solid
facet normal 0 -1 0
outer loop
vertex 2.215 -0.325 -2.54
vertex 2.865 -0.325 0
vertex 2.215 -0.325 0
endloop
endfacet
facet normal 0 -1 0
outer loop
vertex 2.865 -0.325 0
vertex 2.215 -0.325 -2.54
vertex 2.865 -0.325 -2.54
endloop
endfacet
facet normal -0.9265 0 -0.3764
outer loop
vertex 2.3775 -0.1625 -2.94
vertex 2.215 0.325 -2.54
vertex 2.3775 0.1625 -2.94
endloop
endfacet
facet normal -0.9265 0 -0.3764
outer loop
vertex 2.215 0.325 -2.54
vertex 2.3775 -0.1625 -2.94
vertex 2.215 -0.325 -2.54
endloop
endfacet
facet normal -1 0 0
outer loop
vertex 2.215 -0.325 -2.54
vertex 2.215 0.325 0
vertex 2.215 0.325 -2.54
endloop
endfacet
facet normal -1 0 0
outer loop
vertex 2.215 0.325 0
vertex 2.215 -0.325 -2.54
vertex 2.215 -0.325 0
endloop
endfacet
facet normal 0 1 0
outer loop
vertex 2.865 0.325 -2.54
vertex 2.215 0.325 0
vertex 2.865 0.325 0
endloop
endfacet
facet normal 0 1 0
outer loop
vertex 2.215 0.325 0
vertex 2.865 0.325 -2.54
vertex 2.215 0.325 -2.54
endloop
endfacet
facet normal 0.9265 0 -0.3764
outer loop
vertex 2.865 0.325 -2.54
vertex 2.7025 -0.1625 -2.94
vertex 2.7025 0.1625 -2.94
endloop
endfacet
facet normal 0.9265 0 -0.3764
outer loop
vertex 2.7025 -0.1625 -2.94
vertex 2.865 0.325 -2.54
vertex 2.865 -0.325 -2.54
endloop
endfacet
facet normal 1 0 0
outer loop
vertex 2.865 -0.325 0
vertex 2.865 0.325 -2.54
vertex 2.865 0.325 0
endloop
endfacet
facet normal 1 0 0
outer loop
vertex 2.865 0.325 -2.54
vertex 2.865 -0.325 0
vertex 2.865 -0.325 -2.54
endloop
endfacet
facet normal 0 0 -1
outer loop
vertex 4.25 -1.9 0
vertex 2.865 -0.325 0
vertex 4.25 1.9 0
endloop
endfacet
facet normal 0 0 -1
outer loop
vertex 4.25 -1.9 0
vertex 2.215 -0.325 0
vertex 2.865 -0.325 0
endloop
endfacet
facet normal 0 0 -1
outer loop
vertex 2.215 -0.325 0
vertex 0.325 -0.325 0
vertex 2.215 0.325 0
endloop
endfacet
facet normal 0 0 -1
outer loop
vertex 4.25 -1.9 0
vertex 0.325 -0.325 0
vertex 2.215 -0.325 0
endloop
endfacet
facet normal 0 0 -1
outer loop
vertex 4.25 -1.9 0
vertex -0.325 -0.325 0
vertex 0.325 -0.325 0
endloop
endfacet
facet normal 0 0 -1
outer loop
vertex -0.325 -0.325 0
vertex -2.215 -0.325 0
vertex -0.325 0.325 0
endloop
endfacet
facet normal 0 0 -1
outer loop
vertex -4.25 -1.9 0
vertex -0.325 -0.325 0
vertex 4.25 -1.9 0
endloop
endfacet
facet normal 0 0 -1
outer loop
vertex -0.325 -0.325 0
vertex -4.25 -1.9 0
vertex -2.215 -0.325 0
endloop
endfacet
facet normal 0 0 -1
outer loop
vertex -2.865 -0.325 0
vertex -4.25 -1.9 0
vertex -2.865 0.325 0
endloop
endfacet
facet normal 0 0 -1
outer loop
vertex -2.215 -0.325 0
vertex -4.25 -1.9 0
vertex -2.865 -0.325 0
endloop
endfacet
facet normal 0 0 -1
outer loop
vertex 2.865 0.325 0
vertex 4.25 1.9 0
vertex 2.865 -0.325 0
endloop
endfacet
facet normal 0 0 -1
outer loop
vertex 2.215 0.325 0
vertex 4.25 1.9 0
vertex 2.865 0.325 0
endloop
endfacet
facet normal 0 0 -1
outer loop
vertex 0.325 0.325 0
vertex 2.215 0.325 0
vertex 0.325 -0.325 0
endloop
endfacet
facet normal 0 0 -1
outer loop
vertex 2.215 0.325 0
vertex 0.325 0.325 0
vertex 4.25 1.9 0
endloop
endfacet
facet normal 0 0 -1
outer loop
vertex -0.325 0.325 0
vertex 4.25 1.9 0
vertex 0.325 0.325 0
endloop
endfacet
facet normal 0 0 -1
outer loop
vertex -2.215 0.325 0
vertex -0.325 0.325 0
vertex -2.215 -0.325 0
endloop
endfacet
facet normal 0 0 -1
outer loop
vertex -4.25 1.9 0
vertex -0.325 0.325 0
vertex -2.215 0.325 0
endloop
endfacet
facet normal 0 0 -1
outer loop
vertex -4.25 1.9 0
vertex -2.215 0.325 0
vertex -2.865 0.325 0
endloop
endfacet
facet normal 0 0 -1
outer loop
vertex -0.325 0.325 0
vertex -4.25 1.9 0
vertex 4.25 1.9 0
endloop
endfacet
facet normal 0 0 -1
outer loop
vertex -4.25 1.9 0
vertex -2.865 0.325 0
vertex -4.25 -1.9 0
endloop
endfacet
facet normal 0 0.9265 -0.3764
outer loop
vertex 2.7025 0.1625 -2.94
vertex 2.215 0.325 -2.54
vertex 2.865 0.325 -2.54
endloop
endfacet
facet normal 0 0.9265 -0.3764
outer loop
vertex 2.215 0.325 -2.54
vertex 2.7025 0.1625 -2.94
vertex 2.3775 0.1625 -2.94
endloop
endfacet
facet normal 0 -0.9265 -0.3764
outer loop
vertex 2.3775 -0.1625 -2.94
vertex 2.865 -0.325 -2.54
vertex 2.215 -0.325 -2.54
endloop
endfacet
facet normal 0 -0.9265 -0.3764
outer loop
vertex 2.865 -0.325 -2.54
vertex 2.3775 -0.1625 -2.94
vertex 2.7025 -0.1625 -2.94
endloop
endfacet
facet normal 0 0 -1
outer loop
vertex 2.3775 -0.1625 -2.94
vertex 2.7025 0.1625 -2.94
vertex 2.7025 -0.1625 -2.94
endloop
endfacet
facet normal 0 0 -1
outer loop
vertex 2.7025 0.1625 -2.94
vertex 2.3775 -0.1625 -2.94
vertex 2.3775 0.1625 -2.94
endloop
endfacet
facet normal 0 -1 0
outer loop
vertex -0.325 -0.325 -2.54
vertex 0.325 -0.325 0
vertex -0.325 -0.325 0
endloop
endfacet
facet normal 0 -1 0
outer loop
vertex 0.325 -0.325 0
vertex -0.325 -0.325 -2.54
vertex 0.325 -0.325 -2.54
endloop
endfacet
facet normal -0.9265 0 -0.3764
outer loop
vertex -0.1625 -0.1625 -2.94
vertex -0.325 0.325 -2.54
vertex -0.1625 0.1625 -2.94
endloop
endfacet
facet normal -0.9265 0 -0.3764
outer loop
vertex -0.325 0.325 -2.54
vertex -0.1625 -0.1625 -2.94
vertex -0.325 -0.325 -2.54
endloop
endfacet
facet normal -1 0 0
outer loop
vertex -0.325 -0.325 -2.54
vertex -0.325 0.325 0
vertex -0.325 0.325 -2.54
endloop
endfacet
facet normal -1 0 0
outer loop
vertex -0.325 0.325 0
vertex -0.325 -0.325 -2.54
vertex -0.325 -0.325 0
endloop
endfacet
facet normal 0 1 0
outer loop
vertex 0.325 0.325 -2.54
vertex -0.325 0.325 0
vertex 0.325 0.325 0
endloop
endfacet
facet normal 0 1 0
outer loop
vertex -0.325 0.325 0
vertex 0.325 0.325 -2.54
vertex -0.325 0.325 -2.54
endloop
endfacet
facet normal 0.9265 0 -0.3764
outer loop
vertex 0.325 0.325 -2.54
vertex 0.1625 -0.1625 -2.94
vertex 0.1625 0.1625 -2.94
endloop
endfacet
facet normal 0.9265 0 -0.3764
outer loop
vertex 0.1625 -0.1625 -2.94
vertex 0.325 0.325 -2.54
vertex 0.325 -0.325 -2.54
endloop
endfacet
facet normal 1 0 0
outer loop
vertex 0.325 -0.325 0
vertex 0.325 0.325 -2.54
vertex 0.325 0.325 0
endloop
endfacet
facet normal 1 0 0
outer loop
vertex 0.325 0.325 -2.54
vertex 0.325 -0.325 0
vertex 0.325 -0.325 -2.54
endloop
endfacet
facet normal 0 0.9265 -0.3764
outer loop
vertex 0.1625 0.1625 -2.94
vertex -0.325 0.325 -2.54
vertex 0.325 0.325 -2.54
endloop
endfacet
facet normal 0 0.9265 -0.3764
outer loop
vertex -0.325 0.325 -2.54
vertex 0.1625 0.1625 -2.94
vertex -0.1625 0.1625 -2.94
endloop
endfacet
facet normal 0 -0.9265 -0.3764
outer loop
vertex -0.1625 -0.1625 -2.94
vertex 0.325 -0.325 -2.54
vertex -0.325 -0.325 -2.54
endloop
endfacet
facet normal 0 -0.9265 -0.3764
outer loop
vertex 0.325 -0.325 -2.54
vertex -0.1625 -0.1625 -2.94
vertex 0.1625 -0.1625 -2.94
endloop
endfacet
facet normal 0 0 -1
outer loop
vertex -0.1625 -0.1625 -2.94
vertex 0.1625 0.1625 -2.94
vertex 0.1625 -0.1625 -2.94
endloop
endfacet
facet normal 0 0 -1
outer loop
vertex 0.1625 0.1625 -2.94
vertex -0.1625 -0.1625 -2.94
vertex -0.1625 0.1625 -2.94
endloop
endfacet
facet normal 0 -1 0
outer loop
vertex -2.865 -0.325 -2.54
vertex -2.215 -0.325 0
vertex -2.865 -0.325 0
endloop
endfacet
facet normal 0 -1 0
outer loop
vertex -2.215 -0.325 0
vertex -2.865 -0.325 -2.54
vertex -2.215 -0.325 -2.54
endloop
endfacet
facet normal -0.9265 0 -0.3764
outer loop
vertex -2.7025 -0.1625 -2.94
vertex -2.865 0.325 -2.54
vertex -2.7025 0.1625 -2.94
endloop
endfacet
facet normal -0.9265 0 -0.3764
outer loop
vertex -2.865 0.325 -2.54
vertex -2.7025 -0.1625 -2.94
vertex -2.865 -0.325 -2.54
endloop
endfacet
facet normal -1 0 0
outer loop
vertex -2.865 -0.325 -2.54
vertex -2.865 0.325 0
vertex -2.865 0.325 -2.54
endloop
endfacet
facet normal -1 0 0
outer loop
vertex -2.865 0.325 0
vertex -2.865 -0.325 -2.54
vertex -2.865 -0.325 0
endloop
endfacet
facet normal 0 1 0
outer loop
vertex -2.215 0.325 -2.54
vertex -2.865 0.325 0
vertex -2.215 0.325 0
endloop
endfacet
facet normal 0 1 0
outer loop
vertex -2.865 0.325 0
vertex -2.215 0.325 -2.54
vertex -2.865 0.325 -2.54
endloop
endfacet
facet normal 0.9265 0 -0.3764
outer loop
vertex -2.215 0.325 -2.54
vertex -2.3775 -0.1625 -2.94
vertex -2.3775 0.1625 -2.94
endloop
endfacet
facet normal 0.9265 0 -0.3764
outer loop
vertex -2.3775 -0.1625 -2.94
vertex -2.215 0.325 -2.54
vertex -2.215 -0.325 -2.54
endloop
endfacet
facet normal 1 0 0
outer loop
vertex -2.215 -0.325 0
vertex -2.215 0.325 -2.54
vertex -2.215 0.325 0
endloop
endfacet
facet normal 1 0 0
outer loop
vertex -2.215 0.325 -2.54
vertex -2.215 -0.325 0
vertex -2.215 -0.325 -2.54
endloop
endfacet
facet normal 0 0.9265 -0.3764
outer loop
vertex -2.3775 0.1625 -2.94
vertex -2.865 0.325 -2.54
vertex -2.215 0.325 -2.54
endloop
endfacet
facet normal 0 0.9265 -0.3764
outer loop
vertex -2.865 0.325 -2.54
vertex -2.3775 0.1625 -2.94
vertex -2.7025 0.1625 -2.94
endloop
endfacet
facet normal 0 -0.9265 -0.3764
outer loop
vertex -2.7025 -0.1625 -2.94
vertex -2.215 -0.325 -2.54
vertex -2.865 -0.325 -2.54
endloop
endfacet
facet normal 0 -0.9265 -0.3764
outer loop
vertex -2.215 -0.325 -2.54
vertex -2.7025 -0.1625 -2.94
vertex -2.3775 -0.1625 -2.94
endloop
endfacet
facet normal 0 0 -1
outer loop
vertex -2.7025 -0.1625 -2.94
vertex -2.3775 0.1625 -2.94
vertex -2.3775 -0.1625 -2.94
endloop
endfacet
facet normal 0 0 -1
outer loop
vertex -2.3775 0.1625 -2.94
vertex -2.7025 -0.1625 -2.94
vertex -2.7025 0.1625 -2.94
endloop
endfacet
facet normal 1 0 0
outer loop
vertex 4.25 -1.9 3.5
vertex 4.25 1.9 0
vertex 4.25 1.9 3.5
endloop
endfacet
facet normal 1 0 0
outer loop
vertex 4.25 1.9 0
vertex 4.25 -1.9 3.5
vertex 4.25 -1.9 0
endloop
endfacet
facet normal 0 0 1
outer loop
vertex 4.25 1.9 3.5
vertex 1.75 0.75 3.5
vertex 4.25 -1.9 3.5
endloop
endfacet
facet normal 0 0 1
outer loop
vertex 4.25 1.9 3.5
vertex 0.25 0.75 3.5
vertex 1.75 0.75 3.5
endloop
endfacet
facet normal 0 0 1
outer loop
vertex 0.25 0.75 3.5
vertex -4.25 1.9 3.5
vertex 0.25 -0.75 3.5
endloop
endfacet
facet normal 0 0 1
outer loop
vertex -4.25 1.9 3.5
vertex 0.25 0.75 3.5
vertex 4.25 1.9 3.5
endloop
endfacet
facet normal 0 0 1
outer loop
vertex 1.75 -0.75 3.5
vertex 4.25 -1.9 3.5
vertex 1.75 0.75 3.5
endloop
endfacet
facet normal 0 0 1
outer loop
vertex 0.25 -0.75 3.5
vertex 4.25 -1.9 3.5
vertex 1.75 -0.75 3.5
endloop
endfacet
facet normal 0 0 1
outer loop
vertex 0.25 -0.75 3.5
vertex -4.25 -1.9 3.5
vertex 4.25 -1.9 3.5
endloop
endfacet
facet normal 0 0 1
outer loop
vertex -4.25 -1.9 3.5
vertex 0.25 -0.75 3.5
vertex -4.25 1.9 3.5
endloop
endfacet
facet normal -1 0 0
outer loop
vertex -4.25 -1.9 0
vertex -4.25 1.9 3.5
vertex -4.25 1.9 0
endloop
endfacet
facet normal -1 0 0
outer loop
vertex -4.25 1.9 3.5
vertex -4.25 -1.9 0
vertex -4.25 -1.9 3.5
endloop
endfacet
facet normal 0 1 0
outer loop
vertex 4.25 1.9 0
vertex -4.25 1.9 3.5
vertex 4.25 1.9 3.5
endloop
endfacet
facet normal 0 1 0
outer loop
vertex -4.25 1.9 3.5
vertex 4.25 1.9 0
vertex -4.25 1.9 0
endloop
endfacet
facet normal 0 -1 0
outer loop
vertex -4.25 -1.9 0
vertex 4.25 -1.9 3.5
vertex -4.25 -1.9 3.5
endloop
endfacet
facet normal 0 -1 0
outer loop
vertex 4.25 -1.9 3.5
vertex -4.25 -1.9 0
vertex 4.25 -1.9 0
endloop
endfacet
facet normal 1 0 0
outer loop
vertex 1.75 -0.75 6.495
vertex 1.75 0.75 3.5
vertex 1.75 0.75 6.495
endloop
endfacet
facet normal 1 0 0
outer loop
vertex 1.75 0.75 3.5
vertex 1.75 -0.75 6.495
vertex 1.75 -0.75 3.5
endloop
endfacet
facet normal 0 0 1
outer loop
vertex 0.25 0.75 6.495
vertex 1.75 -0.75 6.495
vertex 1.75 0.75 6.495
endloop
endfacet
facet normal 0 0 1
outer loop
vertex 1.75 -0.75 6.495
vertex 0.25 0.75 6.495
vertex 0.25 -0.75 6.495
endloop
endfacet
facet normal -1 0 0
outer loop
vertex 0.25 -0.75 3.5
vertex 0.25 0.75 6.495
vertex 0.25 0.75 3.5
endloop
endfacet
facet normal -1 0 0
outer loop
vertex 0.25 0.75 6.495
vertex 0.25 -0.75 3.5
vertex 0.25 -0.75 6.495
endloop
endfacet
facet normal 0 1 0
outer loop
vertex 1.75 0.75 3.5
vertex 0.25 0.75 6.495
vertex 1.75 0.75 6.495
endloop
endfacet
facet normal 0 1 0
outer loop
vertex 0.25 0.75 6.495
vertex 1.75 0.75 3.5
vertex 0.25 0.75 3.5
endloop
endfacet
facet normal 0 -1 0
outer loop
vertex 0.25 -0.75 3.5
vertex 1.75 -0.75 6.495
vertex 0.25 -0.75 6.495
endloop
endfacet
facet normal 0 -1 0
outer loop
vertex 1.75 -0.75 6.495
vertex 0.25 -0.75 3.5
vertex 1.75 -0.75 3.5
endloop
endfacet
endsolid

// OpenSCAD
$fn=64;

// Body
color("gray") translate([0,0,3.5/2+0.25]) cube([8.5,3.8,3.0], true);
color("saddlebrown") translate([0,0,0.25]) cube([8.5,3.8,0.5], true);

// Packa
color("black") translate([1,0,3.25]) cube([1.5,1.5,6.49], true);

// Pins
color("silver")
{
	hull()
	{
		translate([2.54,0,-2.54/2]) cube([0.65,0.65,2.54], true);
		translate([2.54,0,-2.84]) cube([0.65/2,0.65/2,0.2], true);
	}

	hull()
	{
		translate([0,0,-2.54/2]) cube([0.65,0.65,2.54], true);
		translate([0,0,-2.84]) cube([0.65/2,0.65/2,0.2], true);
	}

	hull()
	{
		translate([-2.54,0,-2.54/2]) cube([0.65,0.65,2.54], true);
		translate([-2.54,0,-2.84]) cube([0.65/2,0.65/2,0.2], true);
	}
}
